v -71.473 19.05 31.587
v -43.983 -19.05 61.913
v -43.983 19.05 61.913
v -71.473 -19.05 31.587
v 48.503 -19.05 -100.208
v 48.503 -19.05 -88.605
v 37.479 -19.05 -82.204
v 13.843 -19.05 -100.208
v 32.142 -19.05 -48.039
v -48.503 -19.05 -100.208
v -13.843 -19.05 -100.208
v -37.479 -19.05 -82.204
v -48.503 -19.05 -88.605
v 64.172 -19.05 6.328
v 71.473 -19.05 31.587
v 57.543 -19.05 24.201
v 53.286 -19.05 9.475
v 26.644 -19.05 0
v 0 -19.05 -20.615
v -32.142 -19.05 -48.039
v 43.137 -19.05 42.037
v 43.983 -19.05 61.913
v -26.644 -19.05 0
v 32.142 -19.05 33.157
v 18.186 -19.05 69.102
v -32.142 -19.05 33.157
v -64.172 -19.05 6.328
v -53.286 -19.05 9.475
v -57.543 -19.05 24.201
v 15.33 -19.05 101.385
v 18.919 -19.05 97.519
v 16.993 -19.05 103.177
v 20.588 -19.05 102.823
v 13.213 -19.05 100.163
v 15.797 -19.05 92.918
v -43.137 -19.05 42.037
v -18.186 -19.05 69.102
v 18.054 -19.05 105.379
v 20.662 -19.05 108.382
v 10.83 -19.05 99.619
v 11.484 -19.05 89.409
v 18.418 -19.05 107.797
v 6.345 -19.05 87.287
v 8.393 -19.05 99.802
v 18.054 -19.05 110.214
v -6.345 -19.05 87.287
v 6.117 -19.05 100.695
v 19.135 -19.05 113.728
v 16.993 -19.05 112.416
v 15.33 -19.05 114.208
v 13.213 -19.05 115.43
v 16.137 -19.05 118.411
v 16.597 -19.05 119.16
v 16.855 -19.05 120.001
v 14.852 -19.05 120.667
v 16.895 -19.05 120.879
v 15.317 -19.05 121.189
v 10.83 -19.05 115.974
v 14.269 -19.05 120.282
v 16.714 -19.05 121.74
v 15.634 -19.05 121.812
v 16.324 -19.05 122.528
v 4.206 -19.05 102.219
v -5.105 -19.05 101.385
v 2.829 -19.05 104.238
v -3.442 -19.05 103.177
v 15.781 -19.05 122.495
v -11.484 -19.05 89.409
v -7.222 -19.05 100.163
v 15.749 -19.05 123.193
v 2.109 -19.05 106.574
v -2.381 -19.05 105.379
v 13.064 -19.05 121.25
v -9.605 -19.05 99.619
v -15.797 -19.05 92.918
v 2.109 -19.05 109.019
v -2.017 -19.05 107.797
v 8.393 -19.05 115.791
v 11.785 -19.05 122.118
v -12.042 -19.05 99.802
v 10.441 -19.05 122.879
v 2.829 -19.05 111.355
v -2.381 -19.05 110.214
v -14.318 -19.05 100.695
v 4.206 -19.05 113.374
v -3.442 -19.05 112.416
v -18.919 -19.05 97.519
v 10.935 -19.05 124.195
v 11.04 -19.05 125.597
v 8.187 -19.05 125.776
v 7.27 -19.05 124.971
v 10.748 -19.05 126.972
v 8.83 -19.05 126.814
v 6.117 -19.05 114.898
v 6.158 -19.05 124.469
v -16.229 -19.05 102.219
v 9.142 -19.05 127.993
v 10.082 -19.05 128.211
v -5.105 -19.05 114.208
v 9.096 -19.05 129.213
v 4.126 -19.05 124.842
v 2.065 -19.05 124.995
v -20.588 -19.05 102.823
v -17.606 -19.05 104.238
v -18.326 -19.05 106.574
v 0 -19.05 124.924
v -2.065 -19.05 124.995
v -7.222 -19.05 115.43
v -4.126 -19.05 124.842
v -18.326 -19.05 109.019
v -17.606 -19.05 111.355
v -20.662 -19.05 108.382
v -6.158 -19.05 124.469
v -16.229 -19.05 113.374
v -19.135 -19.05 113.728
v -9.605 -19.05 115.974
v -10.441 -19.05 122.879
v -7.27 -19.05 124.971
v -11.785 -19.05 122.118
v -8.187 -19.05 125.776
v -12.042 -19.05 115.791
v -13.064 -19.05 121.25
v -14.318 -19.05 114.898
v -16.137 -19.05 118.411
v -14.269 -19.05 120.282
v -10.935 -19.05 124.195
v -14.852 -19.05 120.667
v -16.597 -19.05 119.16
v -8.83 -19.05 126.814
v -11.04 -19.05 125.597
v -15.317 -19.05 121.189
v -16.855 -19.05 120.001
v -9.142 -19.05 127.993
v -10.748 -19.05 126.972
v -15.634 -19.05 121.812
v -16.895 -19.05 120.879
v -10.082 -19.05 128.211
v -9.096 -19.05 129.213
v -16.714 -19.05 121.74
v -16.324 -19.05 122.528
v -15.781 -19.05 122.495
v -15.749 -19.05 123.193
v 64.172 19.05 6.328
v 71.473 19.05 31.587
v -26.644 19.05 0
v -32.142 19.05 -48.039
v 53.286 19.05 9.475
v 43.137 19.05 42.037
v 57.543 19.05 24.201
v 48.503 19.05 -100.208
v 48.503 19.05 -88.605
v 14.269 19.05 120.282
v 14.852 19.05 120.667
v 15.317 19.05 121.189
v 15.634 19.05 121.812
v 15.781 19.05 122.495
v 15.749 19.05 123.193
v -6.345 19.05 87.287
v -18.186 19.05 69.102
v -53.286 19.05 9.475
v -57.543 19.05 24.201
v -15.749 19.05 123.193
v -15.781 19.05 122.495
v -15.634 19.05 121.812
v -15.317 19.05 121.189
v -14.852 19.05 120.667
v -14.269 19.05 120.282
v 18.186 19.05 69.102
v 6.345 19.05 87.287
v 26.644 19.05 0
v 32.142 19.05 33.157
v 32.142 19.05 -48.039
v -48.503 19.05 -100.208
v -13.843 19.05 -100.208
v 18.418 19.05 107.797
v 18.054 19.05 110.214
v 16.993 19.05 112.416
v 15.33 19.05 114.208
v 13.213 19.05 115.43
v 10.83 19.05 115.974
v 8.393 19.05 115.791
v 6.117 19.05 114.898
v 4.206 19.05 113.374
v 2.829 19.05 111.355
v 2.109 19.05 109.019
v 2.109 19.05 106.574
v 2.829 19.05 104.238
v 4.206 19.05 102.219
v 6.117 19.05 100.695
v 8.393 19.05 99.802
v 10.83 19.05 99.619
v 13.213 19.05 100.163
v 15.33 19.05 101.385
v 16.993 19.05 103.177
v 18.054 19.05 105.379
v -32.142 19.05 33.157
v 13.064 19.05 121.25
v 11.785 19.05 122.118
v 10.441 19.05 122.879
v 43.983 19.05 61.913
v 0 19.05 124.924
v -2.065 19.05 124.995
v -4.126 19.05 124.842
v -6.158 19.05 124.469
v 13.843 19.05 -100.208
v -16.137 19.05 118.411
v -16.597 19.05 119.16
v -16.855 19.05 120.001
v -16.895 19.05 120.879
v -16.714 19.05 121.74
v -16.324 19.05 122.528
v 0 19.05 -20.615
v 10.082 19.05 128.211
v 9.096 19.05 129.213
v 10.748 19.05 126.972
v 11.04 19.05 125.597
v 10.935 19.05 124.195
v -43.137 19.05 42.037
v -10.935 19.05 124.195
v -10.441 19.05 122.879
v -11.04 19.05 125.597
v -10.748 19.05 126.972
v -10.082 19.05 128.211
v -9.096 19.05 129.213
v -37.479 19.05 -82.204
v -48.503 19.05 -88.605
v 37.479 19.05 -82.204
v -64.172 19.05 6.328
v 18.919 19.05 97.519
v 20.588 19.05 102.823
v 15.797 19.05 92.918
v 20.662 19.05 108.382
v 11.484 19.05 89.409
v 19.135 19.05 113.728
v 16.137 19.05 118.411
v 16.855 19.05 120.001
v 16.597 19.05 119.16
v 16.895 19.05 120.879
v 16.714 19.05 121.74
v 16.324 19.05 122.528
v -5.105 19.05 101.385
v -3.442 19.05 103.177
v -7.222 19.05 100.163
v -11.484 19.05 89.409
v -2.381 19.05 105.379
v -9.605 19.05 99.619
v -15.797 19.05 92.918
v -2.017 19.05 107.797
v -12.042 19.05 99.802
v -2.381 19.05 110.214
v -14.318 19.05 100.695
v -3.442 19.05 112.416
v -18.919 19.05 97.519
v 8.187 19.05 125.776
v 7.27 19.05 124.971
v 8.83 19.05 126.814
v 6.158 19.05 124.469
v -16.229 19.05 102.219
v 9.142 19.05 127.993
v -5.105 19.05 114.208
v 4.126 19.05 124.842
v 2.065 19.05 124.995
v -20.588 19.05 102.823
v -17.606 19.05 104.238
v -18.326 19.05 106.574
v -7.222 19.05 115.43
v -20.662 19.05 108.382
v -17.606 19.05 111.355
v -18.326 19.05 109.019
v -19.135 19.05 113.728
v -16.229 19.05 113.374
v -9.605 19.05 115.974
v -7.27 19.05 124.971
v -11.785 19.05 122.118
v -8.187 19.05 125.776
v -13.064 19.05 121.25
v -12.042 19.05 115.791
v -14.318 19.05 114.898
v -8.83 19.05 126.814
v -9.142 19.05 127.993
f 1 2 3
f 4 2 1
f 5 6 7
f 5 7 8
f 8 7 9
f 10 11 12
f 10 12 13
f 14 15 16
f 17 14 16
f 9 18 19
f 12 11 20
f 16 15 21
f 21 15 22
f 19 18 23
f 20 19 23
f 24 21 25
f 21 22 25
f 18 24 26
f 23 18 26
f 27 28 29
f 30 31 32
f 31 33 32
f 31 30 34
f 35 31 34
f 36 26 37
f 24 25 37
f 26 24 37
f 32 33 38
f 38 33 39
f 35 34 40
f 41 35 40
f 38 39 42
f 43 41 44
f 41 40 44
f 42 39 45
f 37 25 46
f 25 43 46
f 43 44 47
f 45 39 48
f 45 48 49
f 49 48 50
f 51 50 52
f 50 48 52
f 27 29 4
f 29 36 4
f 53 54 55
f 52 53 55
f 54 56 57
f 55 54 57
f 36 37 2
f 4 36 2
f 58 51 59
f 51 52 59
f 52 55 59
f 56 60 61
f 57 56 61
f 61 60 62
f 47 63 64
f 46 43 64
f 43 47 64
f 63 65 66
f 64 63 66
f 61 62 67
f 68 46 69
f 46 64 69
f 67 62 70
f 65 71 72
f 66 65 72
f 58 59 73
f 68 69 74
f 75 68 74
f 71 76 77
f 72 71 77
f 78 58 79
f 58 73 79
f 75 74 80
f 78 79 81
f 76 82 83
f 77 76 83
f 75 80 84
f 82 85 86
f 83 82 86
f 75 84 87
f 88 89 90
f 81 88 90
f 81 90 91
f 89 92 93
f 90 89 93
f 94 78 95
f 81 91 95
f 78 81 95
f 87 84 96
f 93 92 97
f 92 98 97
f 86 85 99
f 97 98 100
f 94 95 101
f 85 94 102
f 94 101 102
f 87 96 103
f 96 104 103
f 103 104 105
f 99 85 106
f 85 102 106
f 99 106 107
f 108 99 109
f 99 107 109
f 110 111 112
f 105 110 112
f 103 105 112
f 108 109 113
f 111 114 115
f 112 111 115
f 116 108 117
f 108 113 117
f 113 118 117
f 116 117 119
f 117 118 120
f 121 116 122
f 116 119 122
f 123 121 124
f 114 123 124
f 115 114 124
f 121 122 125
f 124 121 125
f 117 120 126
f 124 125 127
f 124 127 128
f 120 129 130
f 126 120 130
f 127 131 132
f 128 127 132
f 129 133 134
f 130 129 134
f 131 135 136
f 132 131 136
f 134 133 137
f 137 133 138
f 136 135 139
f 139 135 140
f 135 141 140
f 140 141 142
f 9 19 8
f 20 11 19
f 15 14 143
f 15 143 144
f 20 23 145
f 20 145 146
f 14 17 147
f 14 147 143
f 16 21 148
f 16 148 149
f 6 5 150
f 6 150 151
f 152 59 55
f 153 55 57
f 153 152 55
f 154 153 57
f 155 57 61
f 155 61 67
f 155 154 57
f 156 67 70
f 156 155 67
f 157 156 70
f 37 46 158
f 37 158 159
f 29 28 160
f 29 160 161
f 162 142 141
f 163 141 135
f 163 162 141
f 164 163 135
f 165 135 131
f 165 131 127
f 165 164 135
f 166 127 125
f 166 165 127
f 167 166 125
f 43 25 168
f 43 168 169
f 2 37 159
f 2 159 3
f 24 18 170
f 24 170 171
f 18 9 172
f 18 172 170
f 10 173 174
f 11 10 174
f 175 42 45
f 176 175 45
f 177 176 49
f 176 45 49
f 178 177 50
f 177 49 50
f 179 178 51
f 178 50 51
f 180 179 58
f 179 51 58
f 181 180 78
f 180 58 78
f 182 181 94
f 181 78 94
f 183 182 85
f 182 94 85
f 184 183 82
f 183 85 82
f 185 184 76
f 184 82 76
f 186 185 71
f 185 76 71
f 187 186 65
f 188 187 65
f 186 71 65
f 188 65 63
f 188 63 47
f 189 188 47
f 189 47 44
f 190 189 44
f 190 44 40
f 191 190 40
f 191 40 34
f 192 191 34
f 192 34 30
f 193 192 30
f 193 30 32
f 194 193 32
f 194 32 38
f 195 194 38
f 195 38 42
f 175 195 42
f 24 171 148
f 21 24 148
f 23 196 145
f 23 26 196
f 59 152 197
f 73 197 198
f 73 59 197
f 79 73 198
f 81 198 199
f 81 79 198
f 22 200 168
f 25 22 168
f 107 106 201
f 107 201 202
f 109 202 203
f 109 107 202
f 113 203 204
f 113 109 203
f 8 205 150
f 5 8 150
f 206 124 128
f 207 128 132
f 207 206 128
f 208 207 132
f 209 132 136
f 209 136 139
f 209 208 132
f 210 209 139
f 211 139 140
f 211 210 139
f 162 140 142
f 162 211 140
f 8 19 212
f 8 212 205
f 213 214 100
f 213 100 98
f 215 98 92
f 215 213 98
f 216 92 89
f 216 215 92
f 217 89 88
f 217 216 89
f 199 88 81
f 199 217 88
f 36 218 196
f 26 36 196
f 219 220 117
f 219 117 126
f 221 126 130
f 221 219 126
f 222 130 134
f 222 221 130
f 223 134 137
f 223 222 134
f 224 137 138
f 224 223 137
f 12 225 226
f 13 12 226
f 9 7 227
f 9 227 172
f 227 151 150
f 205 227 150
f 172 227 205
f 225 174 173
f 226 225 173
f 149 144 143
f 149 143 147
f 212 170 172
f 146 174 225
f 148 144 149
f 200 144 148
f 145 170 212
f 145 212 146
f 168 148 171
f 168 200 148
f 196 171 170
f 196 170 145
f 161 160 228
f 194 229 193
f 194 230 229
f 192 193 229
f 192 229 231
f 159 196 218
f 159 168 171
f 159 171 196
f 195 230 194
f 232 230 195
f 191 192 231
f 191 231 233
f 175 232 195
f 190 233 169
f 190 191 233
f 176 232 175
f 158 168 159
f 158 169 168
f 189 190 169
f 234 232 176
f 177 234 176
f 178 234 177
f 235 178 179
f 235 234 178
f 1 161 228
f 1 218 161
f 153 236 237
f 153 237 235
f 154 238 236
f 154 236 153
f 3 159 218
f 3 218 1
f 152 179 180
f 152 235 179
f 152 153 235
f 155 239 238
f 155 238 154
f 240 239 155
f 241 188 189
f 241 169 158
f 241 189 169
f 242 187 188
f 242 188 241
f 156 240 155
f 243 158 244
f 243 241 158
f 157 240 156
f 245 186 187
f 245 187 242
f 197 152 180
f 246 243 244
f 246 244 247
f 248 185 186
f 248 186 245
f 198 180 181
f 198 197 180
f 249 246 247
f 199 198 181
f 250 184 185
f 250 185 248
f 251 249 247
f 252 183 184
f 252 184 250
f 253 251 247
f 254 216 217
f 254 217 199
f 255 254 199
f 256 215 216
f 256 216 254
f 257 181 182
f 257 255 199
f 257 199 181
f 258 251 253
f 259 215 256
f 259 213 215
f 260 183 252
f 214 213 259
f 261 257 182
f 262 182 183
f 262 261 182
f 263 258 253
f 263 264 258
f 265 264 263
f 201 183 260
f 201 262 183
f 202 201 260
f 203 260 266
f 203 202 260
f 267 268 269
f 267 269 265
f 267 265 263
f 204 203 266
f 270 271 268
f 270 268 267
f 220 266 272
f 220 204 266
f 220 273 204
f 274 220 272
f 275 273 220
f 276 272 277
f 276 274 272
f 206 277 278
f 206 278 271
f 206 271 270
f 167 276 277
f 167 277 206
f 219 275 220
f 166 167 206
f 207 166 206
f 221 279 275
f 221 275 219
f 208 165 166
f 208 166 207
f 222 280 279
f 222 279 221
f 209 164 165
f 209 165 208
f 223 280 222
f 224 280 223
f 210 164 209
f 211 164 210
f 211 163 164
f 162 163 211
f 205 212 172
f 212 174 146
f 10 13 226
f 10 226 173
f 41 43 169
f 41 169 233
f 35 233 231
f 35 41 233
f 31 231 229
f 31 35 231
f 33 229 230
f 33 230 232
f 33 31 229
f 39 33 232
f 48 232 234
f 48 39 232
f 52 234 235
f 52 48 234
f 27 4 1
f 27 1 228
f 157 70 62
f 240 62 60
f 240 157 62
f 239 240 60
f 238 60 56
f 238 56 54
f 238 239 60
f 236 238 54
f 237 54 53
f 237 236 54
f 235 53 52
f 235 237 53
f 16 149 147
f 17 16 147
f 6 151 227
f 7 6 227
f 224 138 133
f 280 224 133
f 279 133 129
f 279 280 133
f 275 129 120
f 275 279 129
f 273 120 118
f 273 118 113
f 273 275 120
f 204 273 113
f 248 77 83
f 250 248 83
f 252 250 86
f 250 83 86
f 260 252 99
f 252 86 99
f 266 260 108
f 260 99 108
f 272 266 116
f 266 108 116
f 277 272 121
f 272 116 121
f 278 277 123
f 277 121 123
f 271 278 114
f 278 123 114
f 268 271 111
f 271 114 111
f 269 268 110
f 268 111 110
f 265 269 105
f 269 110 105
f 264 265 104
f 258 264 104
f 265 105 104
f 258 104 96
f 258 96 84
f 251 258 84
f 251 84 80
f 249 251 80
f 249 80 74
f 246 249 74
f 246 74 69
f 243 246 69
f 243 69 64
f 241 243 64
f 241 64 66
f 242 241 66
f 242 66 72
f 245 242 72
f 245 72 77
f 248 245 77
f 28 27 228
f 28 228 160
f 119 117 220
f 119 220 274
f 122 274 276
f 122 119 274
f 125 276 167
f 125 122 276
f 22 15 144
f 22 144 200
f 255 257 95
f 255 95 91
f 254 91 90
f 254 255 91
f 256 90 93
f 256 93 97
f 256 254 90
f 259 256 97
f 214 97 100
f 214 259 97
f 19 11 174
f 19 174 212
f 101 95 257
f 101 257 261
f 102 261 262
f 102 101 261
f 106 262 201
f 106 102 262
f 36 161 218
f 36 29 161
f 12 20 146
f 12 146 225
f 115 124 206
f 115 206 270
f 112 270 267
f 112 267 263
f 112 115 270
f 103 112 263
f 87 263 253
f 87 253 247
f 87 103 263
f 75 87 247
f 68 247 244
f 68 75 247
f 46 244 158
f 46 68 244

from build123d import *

# Parameters (mm, degrees)
F1_DEPTH      = 19.05
F2_R          = 8.200531
F3_DEPTH      = 38.1
F3_DEPTH_BACK = 25.4
F5_DEPTH      = 38.1


with BuildPart() as f1:
    # F0 (on Front) → F1 (new body, symmetric)
    with BuildSketch(Plane.XZ):
        with BuildLine():
            Line((-32.141831, 33.15654), (-26.644221, 0))
            Line((-26.644221, 0), (-32.141831, -48.038937))
            Line((-32.141831, -48.038937), (-37.479226, -82.203552))
            Line((-37.479226, -82.203552), (-48.503112, -88.604517))
            Line((-48.503112, -88.604517), (-48.503112, -100.208476))
            Line((-48.503112, -100.208476), (-13.84278, -100.208476))
            Line((-13.84278, -100.208476), (0, -20.61474))
            Line((0, -20.61474), (0, 124.924347))
            ThreePointArc((0, 124.924347), (-20.562864, 109.037436), (-6.345349, 87.28686))
            Line((-6.345349, 87.28686), (-18.186359, 69.102459))
            Line((-18.186359, 69.102459), (-43.982837, 61.913271))
            Line((-43.982837, 61.913271), (-71.473219, 31.58654))
            Line((-71.473219, 31.58654), (-64.171686, 6.32793))
            Line((-64.171686, 6.32793), (-53.286485, 9.474526))
            Line((-53.286485, 9.474526), (-57.54343, 24.200819))
            Line((-57.54343, 24.200819), (-43.137055, 42.037293))
            Line((-43.137055, 42.037293), (-32.141831, 33.15654))
        make_face()
        with BuildLine():
            Line((0, 124.924347), (0, -20.61474))
            Line((0, -20.61474), (13.84278, -100.208476))
            Line((13.84278, -100.208476), (48.503112, -100.208476))
            Line((48.503112, -100.208476), (48.503112, -88.604517))
            Line((48.503112, -88.604517), (37.479226, -82.203552))
            Line((37.479226, -82.203552), (32.141831, -48.038937))
            Line((32.141831, -48.038937), (26.644221, 0))
            Line((26.644221, 0), (32.141831, 33.15654))
            Line((32.141831, 33.15654), (43.137055, 42.037293))
            Line((43.137055, 42.037293), (57.54343, 24.200819))
            Line((57.54343, 24.200819), (53.286485, 9.474526))
            Line((53.286485, 9.474526), (64.171686, 6.32793))
            Line((64.171686, 6.32793), (71.473219, 31.58654))
            Line((71.473219, 31.58654), (43.982837, 61.913271))
            Line((43.982837, 61.913271), (18.186359, 69.102459))
            Line((18.186359, 69.102459), (6.345349, 87.28686))
            ThreePointArc((6.345349, 87.28686), (20.562864, 109.037436), (0, 124.924347))
        make_face()
    extrude(amount=F1_DEPTH, both=True)

    # F2 (on face) → F3 (cut, two sides)
    with BuildSketch(Plane.XZ.offset(19.05)) as f3_sk:
        with Locations((-10.217502, 107.796535)):
            Circle(F2_R)
        with Locations((10.217502, 107.796535)):
            Circle(F2_R)
    extrude(amount=-F3_DEPTH, mode=Mode.SUBTRACT)
    extrude(f3_sk.sketch, amount=-F3_DEPTH_BACK, mode=Mode.SUBTRACT)

    # F4 (on face) → F5 (join, through all)
    with BuildSketch(Plane(origin=(0, 19.05, 0), x_dir=(-1, 0, 0), z_dir=(0, 1, 0))):
        with BuildLine():
            ThreePointArc((-6.158323, 124.468817), (-8.54694, 126.271077), (-9.095944, 129.212543))
            ThreePointArc((-9.095944, 129.212543), (-10.942716, 126.29527), (-10.440769, 122.879263))
            ThreePointArc((-10.440769, 122.879263), (-8.347127, 123.802228), (-6.158323, 124.468817))
        make_face()
        with BuildLine():
            ThreePointArc((-16.136752, 118.410561), (-15.235, 119.378746), (-14.268527, 120.282334))
            ThreePointArc((-14.268527, 120.282334), (-15.496071, 121.489871), (-15.748994, 123.193115))
            ThreePointArc((-15.748994, 123.193115), (-16.894778, 120.879016), (-16.136752, 118.410561))
        make_face()
        with BuildLine():
            ThreePointArc((9.095944, 129.212543), (8.54694, 126.271077), (6.158323, 124.468817))
            ThreePointArc((6.158323, 124.468817), (8.347127, 123.802228), (10.440769, 122.879263))
            ThreePointArc((10.440769, 122.879263), (10.942716, 126.29527), (9.095944, 129.212543))
        make_face()
        with BuildLine():
            ThreePointArc((15.748994, 123.193115), (15.496071, 121.489871), (14.268527, 120.282334))
            ThreePointArc((14.268527, 120.282334), (15.235, 119.378746), (16.136752, 118.410561))
            ThreePointArc((16.136752, 118.410561), (16.894778, 120.879016), (15.748994, 123.193115))
        make_face()
    extrude(amount=-F5_DEPTH)


solid = f1.part
